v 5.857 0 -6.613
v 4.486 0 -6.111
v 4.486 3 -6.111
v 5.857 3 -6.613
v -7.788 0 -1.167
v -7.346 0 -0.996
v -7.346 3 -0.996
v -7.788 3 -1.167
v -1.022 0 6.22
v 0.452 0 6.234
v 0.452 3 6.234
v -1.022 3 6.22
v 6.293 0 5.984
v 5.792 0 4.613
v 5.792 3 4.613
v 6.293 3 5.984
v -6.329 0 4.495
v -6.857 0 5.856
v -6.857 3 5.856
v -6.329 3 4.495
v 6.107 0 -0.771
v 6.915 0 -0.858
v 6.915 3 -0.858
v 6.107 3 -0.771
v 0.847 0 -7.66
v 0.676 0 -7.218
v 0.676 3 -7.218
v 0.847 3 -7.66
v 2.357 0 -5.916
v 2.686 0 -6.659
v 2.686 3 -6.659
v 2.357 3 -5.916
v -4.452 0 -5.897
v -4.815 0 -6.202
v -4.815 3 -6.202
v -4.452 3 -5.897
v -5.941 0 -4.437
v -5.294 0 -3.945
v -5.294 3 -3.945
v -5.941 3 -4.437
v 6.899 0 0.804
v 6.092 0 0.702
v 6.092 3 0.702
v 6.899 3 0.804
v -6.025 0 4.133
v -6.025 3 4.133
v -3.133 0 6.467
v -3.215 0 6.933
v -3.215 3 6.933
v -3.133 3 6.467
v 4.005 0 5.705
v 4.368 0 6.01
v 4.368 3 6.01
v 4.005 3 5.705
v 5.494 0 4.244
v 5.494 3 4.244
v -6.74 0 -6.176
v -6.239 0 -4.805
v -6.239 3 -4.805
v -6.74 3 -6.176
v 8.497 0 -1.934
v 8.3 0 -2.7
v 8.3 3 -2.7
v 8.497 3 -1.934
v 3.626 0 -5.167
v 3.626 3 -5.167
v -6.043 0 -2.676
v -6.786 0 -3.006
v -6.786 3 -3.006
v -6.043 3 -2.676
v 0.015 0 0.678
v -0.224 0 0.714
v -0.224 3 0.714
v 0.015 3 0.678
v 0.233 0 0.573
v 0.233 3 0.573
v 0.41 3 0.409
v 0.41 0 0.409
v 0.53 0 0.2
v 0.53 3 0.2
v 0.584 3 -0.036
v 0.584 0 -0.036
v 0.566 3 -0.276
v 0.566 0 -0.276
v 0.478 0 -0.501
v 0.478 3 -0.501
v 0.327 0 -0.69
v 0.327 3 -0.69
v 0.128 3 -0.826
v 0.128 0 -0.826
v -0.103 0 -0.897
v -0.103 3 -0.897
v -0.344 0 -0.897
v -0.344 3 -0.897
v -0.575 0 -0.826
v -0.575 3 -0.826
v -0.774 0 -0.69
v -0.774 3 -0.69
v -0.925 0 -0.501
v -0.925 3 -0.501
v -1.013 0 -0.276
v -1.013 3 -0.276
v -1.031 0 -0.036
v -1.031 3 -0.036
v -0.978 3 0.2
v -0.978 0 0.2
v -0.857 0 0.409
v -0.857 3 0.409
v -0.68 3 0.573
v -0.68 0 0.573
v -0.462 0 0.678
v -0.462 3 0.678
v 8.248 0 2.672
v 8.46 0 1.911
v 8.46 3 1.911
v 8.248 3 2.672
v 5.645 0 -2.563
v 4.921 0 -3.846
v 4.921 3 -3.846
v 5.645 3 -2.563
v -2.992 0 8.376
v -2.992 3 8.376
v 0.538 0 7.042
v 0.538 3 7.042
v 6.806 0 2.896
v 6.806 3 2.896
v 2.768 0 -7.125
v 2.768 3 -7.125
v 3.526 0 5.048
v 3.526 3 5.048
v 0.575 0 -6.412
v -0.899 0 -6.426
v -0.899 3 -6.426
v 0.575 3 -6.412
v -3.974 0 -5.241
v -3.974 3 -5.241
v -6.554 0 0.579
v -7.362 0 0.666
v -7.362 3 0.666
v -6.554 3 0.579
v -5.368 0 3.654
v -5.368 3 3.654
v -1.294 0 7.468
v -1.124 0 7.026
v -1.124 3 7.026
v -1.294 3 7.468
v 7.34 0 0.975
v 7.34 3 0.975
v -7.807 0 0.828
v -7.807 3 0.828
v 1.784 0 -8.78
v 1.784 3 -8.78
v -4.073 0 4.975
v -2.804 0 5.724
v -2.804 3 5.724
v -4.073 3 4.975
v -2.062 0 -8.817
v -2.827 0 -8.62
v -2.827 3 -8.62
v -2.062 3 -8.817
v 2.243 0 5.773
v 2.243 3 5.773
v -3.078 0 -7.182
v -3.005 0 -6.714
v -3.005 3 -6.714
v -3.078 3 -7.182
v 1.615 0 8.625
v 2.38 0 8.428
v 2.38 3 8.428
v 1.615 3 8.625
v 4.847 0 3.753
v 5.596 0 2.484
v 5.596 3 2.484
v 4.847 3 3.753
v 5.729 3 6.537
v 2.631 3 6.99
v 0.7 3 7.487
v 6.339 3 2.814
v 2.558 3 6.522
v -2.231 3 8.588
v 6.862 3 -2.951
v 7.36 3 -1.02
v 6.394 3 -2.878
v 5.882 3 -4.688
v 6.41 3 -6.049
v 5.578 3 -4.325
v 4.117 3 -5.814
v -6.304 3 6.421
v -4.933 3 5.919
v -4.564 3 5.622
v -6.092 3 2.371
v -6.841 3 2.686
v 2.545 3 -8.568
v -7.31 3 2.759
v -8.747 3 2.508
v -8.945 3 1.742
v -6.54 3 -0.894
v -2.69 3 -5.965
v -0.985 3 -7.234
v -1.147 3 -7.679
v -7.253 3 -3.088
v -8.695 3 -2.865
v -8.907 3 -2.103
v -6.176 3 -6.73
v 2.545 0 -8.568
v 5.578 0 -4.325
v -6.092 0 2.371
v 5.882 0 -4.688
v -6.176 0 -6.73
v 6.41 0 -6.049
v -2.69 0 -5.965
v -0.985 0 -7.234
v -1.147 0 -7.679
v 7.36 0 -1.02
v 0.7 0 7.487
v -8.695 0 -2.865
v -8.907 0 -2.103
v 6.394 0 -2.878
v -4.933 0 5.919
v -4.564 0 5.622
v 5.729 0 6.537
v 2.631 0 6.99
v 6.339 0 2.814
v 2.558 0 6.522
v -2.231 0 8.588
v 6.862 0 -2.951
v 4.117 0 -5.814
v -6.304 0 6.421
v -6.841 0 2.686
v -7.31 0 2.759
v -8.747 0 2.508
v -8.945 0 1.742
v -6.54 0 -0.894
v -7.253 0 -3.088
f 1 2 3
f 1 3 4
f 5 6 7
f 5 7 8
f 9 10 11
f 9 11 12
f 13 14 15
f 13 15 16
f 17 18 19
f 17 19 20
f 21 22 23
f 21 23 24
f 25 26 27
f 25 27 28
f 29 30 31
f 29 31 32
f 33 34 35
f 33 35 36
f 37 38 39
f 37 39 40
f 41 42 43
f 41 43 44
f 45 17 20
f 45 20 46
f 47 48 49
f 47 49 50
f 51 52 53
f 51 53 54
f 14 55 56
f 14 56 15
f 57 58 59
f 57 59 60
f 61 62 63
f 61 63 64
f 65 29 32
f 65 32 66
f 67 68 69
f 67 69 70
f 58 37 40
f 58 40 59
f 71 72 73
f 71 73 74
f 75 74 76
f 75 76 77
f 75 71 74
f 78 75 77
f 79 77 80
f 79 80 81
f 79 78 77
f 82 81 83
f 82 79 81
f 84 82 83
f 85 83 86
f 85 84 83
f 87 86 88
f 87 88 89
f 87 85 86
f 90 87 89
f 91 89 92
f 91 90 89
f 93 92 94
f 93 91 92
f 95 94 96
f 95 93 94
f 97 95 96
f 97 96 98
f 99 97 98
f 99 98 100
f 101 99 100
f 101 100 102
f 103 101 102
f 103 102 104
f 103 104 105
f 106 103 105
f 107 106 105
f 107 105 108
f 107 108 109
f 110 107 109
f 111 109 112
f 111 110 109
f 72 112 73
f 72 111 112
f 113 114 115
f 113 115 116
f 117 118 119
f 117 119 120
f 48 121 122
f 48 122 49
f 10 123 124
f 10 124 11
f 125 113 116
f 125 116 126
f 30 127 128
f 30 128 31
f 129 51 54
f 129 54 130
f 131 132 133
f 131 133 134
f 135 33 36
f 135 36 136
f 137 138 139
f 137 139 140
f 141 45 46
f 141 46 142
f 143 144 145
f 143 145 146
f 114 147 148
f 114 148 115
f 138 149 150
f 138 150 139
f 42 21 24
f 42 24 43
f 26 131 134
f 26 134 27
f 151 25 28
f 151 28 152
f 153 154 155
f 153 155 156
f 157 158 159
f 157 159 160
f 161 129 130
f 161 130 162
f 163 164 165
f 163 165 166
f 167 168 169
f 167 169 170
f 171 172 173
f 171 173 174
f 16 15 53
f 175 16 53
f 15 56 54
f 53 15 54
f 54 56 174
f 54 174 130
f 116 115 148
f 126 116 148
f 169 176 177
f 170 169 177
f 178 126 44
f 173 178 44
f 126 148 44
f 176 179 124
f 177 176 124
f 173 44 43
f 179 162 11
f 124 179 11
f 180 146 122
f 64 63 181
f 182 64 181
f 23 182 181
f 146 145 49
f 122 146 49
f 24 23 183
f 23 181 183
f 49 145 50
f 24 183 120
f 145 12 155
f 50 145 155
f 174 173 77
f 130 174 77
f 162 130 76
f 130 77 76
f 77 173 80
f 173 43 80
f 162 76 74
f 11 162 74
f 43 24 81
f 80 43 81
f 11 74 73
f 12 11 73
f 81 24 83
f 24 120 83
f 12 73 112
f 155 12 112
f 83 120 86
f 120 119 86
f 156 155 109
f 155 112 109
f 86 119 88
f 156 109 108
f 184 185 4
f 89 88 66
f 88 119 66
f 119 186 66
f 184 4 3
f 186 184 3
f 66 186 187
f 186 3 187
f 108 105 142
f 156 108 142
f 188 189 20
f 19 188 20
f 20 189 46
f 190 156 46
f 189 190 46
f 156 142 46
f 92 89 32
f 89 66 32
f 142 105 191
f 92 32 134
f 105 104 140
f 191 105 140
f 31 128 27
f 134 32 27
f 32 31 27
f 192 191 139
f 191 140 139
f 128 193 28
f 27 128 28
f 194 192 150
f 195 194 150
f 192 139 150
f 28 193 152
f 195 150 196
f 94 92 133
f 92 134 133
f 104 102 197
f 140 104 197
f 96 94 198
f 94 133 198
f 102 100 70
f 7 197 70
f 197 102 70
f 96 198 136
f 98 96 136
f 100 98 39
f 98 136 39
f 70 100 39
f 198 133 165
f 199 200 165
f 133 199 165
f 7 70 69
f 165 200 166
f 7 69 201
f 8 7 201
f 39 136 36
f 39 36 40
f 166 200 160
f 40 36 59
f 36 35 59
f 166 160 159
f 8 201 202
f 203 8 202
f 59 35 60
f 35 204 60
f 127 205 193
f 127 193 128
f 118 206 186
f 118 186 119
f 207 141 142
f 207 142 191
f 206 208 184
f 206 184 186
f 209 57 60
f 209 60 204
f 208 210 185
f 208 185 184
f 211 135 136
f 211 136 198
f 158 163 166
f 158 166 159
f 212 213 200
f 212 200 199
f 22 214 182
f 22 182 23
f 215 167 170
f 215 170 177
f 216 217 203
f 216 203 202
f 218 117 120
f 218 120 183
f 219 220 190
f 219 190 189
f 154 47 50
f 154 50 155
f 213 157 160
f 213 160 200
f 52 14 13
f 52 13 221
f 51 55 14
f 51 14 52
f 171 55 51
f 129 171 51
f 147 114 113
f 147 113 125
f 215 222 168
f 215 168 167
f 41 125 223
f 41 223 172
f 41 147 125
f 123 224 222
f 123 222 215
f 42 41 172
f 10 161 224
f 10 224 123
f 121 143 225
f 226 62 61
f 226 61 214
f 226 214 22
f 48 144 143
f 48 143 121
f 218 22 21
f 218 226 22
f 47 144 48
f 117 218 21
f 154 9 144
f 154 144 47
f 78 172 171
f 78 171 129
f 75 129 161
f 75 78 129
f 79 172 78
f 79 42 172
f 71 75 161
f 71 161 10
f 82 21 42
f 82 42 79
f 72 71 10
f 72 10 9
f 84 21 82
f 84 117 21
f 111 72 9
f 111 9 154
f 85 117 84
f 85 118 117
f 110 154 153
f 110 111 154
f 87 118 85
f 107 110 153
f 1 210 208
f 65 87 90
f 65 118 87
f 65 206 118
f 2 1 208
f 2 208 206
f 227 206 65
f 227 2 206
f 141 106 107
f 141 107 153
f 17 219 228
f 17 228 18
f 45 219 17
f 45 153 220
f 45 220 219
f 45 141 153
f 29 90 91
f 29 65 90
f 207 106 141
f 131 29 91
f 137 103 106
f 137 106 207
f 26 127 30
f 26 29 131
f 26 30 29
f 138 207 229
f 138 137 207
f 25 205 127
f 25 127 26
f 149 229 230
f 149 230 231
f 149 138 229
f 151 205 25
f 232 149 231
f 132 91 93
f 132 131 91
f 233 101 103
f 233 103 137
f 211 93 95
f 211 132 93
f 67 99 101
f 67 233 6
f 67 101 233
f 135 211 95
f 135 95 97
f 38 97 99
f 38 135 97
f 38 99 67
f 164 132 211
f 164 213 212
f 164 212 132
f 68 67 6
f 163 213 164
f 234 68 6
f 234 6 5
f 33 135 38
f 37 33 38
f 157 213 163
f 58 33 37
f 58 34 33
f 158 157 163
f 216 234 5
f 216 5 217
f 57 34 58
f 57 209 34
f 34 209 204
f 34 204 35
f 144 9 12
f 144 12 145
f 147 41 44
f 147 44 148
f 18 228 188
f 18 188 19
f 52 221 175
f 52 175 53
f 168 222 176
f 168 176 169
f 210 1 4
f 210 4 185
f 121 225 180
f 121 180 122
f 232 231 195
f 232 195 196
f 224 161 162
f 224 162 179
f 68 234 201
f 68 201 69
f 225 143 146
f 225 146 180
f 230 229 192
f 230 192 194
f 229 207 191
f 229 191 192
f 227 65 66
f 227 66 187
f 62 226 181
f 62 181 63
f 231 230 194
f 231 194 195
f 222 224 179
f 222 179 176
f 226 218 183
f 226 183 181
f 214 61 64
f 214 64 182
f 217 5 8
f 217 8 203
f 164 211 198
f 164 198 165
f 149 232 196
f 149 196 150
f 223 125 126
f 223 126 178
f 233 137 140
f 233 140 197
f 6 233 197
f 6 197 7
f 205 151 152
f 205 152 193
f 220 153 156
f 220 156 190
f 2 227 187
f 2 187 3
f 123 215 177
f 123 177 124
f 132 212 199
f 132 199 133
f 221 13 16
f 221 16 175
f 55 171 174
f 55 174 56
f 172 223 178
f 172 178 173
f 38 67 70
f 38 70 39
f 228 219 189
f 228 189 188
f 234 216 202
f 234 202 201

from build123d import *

# Parameters (mm, degrees)
SKETCH1_R           = 0.81
BOSS_EXTRUDE1_DEPTH = 3


with BuildPart() as part:
    # Sketch1 → Boss-Extrude1 (new body)
    with BuildSketch(Plane(origin=(0, 0, 0), x_dir=(1, 0, 0), z_dir=(0, 1, 0))):
        Polygon((5.6453129, 2.562826463), (6.3943589, 2.877662463), (6.8624159, 2.950894463), (8.3003709, 2.699622463), (8.4974959, 1.934301463), (7.3598559, 1.019628463), (6.9146609, 0.857633463), (6.1067249, 0.771435463), (6.0924239, -0.702085537), (6.8985319, -0.803957537), (7.3404979, -0.974570537), (8.4601699, -1.911153537), (8.2482219, -2.672493537), (6.8056559, -2.895801537), (6.3391139, -2.813510537), (5.5963139, -2.484188537), (4.8471689, -3.753135537), (5.4943549, -4.244415537), (5.7917899, -4.613151537), (6.2931629, -5.984095537), (5.7289469, -6.537468537), (4.3679989, -6.009575537), (4.0051049, -5.705026537), (3.5264829, -5.048435537), (2.2432229, -5.772805537), (2.5580589, -6.521851537), (2.6312909, -6.989908537), (2.3800189, -8.427863537), (1.6146979, -8.624988537), (0.7000259, -7.487348537), (0.5380299, -7.042153537), (0.4518319, -6.234217537), (-1.0216891, -6.219916537), (-1.1235611, -7.026024537), (-1.2941741, -7.467990537), (-2.2307561, -8.587662537), (-2.9920971, -8.375714537), (-3.2154051, -6.933148537), (-3.1331131, -6.466606537), (-2.8037921, -5.723806537), (-4.0727391, -4.974661537), (-4.5640191, -5.621847537), (-4.9327541, -5.919282537), (-6.3036991, -6.420655537), (-6.8570721, -5.856439537), (-6.3291791, -4.495491537), (-6.0246291, -4.132597537), (-5.3680391, -3.653975537), (-6.0924091, -2.370715537), (-6.8414551, -2.685551537), (-7.3095121, -2.758783537), (-8.7474671, -2.507511537), (-8.9445921, -1.742190537), (-7.8069511, -0.827518537), (-7.3617561, -0.665522537), (-6.5538201, -0.579324537), (-6.5395191, 0.894196463), (-7.3456281, 0.996068463), (-7.7875941, 1.166681463), (-8.9072661, 2.103264463), (-8.6953181, 2.864604463), (-7.2527521, 3.087912463), (-6.7862101, 3.005620463), (-6.0434091, 2.676299463), (-5.2942651, 3.945246463), (-5.9414511, 4.436526463), (-6.2388861, 4.805262463), (-6.7402581, 6.176206463), (-6.1760431, 6.729579463), (-4.8150951, 6.201686463), (-4.4522011, 5.897137463), (-3.9735791, 5.240546463), (-2.6903191, 5.964916463), (-3.0051541, 6.713962463), (-3.0783871, 7.182019463), (-2.8271151, 8.619974463), (-2.0617941, 8.817099463), (-1.1471211, 7.679458463), (-0.9851261, 7.234264463), (-0.8989281, 6.426327463), (0.5745929, 6.412026463), (0.6764649, 7.218135463), (0.8470779, 7.660101463), (1.7836609, 8.779773463), (2.5450009, 8.567825463), (2.7683089, 7.125259463), (2.6860179, 6.658717463), (2.3566959, 5.915916463), (3.6256429, 5.166772463), (4.1169229, 5.813958463), (4.4856589, 6.111393463), (5.8566029, 6.612765463), (6.4099759, 6.048550463), (5.8820829, 4.687602463), (5.5775339, 4.324708463), (4.9209439, 3.846086463), align=None)
        with Locations(Location((-0.2235476, 0.096055463, 0), (0, 0, 270))):
            Circle(SKETCH1_R, mode=Mode.SUBTRACT)
    extrude(amount=BOSS_EXTRUDE1_DEPTH)


solid = part.part
